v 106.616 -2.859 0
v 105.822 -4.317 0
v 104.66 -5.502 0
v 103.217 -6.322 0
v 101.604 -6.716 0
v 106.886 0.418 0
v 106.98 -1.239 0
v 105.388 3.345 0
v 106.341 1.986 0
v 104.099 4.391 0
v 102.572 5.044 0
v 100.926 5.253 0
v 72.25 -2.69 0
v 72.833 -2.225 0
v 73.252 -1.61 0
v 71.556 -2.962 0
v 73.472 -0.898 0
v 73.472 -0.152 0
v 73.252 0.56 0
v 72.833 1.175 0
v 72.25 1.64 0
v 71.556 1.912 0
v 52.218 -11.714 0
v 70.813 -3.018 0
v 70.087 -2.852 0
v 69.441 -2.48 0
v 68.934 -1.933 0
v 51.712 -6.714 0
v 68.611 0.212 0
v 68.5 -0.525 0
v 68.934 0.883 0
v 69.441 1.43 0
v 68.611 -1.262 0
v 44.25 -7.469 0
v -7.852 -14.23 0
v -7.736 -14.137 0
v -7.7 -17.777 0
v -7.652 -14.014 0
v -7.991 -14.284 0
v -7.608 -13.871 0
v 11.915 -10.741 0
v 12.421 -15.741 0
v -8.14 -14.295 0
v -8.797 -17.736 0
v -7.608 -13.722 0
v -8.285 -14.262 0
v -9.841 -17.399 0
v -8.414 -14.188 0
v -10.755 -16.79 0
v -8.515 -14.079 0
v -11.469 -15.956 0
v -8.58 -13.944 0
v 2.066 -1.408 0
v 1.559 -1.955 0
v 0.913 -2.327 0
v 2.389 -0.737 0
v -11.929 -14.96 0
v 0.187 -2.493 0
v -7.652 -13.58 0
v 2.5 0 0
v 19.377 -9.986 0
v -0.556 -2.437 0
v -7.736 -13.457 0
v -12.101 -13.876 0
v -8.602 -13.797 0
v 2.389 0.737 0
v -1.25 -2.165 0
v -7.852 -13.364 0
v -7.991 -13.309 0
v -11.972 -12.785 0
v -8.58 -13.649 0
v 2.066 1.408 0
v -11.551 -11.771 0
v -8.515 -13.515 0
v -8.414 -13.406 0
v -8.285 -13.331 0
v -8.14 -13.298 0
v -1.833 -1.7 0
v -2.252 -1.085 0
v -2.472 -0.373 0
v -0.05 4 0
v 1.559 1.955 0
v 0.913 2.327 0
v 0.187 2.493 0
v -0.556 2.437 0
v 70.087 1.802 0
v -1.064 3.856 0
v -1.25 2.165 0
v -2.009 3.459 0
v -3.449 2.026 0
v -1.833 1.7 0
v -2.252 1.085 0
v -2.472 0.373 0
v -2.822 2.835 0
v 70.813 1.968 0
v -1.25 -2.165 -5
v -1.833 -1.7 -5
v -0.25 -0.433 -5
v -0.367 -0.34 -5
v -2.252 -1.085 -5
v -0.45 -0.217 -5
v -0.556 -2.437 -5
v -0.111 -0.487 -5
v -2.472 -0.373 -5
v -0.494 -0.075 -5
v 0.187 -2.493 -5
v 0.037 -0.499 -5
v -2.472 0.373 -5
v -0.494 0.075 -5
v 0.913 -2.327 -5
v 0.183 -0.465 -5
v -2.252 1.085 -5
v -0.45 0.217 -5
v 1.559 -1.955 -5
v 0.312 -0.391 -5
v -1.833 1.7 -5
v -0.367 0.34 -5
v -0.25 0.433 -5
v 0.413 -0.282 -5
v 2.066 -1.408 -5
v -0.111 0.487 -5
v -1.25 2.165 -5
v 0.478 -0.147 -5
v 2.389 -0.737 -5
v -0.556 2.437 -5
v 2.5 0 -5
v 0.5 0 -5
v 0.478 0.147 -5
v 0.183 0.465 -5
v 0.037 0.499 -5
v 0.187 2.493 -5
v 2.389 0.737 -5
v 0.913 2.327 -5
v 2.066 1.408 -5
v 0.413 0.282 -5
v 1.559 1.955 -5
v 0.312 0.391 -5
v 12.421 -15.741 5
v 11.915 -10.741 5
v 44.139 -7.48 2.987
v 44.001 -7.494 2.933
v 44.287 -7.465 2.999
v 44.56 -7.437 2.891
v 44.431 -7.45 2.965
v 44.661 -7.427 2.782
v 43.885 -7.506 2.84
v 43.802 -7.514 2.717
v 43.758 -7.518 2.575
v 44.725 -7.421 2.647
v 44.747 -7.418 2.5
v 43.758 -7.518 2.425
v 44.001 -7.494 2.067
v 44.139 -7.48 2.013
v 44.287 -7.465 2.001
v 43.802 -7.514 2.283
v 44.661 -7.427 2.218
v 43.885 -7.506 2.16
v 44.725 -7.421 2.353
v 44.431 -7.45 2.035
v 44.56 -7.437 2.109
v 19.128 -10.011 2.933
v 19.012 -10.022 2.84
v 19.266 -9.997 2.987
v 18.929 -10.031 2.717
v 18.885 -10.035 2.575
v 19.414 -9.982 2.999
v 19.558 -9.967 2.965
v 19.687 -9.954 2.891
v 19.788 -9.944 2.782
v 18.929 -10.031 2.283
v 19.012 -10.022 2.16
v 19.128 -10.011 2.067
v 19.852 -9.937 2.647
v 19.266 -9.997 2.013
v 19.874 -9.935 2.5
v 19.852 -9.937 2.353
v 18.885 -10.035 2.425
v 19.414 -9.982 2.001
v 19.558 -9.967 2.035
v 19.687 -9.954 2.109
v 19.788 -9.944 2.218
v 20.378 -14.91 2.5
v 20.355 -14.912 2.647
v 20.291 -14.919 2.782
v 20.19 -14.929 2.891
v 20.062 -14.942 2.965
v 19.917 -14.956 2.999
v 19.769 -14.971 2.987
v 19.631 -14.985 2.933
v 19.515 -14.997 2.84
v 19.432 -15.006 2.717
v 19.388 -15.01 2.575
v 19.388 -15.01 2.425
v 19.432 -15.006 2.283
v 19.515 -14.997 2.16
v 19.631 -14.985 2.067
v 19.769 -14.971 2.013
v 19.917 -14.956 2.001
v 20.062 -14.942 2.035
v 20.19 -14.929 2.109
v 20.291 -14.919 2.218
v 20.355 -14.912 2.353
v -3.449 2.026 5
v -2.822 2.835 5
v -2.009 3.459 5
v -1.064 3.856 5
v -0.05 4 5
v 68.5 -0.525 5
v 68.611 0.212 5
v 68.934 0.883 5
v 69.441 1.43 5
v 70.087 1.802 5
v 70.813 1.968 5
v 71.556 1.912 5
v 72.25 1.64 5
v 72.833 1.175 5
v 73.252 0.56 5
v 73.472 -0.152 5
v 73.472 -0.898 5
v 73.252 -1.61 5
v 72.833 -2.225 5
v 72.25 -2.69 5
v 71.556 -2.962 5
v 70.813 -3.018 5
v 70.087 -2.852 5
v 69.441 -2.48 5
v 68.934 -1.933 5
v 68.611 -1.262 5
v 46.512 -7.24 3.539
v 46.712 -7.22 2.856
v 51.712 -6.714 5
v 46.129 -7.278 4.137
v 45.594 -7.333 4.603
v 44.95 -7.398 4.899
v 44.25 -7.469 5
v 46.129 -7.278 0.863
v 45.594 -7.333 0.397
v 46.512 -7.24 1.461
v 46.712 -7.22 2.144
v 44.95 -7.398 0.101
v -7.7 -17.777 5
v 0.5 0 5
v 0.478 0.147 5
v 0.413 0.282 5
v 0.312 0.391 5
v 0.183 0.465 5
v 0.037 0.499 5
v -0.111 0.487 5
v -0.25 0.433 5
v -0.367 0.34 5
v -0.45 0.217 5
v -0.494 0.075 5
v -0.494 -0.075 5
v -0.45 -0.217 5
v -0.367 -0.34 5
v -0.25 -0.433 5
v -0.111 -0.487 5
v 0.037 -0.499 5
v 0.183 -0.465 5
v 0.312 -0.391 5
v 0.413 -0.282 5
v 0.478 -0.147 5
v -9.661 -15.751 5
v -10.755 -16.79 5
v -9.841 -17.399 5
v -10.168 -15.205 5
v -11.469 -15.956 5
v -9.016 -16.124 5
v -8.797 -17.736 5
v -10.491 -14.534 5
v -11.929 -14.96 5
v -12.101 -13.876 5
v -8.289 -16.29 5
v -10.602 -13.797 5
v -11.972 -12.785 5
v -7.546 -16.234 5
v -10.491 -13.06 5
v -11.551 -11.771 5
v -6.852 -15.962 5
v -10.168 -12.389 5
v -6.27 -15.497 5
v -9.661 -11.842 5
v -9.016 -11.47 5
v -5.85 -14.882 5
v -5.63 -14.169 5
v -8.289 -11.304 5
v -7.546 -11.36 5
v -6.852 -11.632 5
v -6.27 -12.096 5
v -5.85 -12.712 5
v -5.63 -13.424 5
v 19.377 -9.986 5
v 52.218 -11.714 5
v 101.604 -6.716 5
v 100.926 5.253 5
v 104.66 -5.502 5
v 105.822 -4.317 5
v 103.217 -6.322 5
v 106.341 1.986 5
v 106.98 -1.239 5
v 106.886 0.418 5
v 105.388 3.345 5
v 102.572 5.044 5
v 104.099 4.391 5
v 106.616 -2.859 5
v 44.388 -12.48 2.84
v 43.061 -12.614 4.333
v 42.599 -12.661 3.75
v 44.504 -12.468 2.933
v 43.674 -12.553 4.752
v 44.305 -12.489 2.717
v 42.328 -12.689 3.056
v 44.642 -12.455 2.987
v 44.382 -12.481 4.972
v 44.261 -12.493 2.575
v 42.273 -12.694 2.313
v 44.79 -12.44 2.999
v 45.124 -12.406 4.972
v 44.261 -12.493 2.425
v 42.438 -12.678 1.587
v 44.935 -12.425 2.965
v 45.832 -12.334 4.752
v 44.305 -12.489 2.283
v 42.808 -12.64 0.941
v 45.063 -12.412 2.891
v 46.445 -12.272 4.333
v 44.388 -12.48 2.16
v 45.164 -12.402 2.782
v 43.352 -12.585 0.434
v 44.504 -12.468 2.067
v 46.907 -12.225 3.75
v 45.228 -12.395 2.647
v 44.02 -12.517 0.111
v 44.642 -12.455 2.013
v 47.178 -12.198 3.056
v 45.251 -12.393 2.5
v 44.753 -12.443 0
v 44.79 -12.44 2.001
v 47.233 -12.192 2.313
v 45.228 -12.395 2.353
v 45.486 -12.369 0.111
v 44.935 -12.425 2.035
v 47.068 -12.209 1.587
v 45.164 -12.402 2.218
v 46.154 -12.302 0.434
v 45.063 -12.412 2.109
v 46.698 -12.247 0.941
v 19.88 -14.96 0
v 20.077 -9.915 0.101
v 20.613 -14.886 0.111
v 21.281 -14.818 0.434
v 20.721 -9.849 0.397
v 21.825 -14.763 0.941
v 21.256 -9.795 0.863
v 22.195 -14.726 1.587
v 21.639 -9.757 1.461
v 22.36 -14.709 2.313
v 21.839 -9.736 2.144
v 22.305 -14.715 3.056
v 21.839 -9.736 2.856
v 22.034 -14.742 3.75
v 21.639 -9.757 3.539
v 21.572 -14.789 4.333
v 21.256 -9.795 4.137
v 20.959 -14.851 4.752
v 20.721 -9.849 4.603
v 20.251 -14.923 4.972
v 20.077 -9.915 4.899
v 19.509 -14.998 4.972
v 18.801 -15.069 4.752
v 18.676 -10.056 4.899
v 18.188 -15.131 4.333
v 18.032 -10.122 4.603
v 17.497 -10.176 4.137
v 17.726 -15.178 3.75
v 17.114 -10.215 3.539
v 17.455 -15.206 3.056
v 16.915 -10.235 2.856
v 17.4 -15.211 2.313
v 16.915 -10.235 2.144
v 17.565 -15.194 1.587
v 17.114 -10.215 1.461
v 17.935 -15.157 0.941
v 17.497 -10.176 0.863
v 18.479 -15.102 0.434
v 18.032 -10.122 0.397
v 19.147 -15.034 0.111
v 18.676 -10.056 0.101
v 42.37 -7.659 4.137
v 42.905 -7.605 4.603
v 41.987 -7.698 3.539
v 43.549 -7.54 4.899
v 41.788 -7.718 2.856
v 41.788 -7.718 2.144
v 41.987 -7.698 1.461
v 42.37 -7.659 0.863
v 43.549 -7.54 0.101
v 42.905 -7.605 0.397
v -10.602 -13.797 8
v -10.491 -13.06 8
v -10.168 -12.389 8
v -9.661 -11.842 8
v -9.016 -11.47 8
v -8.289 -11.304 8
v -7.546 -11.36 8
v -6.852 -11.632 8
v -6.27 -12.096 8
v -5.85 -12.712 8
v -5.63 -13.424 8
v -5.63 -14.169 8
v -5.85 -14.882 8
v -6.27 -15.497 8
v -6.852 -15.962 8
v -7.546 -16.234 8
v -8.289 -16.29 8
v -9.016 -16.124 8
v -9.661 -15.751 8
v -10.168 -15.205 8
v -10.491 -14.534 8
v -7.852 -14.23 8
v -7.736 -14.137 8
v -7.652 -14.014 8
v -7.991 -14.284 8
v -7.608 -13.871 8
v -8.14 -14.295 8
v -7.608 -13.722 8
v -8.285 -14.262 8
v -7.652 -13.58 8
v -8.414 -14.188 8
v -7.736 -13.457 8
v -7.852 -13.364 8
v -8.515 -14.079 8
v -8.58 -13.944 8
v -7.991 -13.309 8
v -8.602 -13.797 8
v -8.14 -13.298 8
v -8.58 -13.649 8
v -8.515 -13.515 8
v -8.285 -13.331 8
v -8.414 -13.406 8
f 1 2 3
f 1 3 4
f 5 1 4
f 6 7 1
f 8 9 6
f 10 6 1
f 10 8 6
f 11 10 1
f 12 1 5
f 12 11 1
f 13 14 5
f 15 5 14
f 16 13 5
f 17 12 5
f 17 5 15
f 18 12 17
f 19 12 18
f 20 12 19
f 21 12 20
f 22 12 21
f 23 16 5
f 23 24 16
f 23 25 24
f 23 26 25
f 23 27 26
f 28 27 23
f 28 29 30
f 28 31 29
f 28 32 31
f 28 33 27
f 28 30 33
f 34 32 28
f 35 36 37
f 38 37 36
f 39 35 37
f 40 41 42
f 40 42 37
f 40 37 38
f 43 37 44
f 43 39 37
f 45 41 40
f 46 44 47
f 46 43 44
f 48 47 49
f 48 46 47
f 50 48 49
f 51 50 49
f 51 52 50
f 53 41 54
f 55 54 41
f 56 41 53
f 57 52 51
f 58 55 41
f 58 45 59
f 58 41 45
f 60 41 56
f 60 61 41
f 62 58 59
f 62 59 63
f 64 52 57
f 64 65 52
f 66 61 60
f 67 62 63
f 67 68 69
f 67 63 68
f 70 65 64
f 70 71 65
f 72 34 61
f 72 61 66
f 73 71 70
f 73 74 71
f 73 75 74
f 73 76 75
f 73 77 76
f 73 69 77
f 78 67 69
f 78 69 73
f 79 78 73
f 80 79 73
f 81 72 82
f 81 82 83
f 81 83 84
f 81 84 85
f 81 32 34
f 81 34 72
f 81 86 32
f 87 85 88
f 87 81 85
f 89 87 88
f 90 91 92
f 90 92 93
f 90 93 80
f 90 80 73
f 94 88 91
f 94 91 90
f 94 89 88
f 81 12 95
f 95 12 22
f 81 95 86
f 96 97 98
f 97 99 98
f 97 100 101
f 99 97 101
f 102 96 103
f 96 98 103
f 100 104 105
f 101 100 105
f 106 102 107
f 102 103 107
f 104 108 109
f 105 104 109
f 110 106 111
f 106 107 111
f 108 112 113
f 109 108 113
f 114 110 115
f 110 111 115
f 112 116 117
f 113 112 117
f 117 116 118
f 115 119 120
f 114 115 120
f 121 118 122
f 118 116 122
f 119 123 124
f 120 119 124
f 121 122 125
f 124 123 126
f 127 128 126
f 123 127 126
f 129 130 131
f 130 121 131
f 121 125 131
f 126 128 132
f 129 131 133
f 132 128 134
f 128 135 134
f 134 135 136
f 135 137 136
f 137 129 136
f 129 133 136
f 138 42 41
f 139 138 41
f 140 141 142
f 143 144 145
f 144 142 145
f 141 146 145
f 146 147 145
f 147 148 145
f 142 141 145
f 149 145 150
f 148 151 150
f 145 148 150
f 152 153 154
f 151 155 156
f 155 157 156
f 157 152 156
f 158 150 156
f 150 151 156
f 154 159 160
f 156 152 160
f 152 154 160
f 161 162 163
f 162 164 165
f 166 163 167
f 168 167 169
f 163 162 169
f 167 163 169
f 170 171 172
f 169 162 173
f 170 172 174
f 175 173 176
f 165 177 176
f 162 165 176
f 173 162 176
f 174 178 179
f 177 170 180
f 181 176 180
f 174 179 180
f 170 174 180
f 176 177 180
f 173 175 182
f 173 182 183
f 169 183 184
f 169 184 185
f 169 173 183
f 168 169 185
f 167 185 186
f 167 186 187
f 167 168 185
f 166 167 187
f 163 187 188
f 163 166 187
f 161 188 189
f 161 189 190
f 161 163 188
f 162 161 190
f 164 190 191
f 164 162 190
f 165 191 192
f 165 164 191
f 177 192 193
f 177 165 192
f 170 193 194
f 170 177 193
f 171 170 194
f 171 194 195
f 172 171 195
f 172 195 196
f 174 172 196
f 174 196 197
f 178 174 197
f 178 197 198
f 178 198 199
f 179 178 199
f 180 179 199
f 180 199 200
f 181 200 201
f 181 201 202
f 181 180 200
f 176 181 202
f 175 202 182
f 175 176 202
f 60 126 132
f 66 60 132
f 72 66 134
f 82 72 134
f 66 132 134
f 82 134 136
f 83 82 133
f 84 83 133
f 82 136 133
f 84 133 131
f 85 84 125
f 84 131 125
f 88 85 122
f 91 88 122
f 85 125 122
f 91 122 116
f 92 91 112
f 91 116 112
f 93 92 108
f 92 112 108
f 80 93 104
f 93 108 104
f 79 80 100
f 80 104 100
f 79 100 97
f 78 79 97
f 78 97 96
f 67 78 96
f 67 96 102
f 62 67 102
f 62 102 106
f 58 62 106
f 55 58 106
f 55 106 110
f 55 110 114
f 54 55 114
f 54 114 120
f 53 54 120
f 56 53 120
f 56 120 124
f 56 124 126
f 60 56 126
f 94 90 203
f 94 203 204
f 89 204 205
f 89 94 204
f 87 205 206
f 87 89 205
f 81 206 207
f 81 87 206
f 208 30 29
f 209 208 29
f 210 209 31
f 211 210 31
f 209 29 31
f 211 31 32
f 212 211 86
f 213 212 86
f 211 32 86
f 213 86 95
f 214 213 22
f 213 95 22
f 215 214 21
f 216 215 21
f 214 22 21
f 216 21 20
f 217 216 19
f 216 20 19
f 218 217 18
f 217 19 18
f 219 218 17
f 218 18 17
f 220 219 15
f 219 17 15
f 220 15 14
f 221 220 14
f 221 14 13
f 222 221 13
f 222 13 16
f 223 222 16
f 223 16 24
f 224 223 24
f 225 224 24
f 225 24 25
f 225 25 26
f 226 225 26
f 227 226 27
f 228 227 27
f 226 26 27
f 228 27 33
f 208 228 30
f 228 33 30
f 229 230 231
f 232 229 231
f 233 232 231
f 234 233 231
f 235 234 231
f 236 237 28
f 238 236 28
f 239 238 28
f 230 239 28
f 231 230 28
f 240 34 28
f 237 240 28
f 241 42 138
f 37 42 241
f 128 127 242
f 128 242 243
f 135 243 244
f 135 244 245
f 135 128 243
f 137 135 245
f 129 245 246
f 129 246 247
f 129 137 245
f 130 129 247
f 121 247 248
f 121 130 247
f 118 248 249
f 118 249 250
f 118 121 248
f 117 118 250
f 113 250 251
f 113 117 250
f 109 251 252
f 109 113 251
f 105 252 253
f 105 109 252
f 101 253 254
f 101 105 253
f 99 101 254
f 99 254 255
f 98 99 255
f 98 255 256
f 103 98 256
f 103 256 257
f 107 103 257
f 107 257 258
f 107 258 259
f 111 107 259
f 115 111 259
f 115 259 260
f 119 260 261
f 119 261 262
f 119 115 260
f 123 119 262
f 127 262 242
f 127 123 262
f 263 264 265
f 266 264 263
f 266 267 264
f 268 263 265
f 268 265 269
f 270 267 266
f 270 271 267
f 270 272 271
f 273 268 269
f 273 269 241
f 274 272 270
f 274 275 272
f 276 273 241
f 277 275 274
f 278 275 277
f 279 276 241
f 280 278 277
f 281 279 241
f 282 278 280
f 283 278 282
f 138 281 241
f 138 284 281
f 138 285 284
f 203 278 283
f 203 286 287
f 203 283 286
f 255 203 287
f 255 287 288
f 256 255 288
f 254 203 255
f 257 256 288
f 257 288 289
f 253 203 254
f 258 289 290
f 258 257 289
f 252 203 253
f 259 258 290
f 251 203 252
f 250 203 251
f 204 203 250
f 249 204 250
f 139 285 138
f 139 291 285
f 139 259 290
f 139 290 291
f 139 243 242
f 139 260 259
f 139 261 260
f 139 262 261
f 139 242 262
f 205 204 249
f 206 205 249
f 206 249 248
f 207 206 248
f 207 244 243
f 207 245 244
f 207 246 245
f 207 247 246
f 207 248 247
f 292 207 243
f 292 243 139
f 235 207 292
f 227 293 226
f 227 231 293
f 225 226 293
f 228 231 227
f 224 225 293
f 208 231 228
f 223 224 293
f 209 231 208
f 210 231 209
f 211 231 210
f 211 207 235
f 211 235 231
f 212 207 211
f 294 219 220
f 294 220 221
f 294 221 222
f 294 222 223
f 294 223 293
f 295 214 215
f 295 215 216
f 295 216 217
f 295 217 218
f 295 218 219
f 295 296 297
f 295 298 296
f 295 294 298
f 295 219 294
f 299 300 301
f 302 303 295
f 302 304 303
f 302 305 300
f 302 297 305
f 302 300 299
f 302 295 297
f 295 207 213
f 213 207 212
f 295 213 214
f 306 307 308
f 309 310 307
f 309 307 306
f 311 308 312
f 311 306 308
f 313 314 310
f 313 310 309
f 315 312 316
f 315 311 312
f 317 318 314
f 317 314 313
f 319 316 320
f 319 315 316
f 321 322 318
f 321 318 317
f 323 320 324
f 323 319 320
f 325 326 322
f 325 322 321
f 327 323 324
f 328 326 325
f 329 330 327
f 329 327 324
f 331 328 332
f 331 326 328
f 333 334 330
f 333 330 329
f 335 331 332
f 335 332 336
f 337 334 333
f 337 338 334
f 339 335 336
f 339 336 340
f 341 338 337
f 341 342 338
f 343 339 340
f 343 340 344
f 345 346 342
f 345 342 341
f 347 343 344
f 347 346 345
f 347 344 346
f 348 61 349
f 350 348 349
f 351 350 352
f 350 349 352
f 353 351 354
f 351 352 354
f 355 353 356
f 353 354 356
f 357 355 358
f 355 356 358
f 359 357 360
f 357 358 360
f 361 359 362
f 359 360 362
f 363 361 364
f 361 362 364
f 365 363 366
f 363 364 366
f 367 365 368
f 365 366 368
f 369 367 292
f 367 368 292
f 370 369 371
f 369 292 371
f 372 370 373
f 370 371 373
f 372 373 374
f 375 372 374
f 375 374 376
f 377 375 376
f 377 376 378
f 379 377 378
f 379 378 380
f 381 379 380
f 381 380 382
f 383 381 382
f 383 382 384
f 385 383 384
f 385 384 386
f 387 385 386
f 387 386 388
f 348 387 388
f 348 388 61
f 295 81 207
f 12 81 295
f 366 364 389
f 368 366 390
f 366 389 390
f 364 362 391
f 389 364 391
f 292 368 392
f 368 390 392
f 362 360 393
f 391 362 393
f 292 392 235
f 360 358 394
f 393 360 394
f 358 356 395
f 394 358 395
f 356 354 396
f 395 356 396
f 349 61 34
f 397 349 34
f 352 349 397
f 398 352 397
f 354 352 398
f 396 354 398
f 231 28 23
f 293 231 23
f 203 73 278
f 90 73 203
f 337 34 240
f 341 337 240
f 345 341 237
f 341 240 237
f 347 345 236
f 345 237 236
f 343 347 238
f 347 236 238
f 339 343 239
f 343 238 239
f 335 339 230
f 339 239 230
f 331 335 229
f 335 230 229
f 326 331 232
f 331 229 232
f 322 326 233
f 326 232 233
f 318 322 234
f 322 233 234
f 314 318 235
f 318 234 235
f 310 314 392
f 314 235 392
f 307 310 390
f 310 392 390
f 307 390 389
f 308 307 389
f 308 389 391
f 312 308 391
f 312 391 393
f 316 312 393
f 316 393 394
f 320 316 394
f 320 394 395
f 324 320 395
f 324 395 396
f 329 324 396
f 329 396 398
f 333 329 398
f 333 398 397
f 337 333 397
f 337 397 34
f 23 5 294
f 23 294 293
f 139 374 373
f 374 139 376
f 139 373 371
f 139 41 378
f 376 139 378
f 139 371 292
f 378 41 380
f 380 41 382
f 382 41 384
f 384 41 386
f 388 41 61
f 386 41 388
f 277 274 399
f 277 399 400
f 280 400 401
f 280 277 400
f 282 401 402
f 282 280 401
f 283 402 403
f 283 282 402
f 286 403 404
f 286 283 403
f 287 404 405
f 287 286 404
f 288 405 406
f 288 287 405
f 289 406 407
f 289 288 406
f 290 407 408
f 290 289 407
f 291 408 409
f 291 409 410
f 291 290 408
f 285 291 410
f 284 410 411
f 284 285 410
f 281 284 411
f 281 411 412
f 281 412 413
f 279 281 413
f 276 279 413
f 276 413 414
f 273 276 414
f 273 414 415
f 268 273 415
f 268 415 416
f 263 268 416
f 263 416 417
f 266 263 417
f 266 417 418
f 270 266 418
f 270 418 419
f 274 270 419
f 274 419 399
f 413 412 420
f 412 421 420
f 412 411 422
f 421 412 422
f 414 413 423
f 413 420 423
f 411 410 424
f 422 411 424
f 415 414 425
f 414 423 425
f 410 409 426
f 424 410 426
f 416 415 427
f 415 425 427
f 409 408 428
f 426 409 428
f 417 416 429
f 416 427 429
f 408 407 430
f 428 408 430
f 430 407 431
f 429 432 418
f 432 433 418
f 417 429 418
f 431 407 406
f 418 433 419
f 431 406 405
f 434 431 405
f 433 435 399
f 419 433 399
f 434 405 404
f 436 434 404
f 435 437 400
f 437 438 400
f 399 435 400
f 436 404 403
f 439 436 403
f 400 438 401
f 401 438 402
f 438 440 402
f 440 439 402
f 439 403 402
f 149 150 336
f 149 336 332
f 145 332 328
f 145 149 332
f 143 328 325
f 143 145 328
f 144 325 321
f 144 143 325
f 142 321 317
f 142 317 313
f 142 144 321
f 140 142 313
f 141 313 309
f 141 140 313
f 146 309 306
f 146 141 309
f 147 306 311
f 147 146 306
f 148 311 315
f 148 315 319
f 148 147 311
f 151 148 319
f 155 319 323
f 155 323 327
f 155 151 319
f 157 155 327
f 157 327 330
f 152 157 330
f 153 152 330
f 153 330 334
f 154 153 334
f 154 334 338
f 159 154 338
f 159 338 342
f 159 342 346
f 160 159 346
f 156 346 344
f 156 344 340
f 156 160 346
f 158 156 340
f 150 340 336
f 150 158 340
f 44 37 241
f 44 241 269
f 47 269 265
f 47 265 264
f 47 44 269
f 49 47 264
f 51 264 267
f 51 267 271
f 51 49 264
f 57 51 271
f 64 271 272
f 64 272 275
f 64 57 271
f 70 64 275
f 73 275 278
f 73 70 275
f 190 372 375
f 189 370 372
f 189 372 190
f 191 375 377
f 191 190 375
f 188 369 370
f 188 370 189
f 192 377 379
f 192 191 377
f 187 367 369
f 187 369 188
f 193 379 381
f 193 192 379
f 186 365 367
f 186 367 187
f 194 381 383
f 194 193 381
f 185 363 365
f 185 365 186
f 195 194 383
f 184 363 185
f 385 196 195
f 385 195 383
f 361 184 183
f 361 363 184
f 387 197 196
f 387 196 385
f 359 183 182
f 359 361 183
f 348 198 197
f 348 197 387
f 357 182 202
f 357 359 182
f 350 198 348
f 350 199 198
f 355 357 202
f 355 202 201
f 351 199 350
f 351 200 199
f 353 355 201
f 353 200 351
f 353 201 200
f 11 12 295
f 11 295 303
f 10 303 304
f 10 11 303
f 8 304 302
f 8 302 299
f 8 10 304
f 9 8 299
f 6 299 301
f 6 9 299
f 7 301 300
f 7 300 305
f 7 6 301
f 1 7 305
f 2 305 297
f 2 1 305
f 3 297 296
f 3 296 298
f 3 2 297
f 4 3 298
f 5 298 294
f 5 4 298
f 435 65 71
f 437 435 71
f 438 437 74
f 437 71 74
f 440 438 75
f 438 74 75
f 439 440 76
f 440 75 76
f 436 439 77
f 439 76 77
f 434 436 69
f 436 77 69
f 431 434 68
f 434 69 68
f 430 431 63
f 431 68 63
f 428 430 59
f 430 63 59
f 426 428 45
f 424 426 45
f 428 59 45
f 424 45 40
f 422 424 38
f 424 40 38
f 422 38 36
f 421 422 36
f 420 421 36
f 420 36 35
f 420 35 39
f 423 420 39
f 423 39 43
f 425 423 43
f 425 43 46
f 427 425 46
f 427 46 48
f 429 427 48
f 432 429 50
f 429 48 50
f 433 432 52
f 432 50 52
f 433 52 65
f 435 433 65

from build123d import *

# Parameters (mm, degrees)
SKETCH3_R           = 2.5
BOSS_EXTRUDE1_DEPTH = 5
BOSS_EXTRUDE2_START = -10
SKETCH4_R           = 2.5
SKETCH4_R_2         = 0.5
BOSS_EXTRUDE2_DEPTH = 10
SKETCH5_R           = 2.5
SKETCH5_R_2         = 0.5
BOSS_EXTRUDE3_DEPTH = 8
SKETCH6_R           = 2.5
CUT_EXTRUDE1_DEPTH  = 5
CUT_EXTRUDE2_DEPTH  = 5
SKETCH8_R           = 2.5
SKETCH8_R_2         = 0.5
BOSS_EXTRUDE4_DEPTH = 5


with BuildPart() as part:
    # Sketch3 → Boss-Extrude1 (new body)
    with BuildSketch(Plane.XY):
        with BuildLine():
            Line((-11.551452097, -11.771319146), (-3.449219334, 2.025558191))
            ThreePointArc((-3.449219334, 2.025558191), (-2.00867995, 3.459075723), (-0.049634206, 3.999692044))
            Line((-0.049634206, 3.999692044), (100.92554869, 5.252744283))
            ThreePointArc((100.92554869, 5.252744283), (106.990382731, -0.40721355), (101.604045304, -6.716310453))
            Line((101.604045304, -6.716310453), (-7.699535894, -17.776555117))
            ThreePointArc((-7.699535894, -17.776555117), (-11.469136318, -15.956497778), (-11.551452097, -11.771319146))
        make_face()
        with Locations((-8.102232763, -13.796877337)):
            Circle(SKETCH3_R, mode=Mode.SUBTRACT)
        Circle(SKETCH3_R, mode=Mode.SUBTRACT)
    extrude(amount=BOSS_EXTRUDE1_DEPTH)

    # Sketch4 → Boss-Extrude2 (add)
    with BuildSketch(Plane.XY.offset(5).offset(BOSS_EXTRUDE2_START)):
        Circle(SKETCH4_R)
        Circle(SKETCH4_R_2, mode=Mode.SUBTRACT)
    extrude(amount=BOSS_EXTRUDE2_DEPTH)

    # Sketch5 → Boss-Extrude3 (add)
    with BuildSketch(Plane(origin=(0, 0, 0), x_dir=(-1, 0, 0), z_dir=(0, 0, -1))):
        with Locations((8.102232763, -13.796877337)):
            Circle(SKETCH5_R)
        with Locations((8.102232763, -13.796877337)):
            Circle(SKETCH5_R_2, mode=Mode.SUBTRACT)
    extrude(amount=-BOSS_EXTRUDE3_DEPTH)

    # Sketch6 → Cut-Extrude1 (cut)
    with BuildSketch(Plane(origin=(0, 0, 0), x_dir=(-1, 0, 0), z_dir=(0, 0, -1))):
        with Locations((-71, -0.524973847)):
            Circle(SKETCH6_R)
    extrude(amount=-CUT_EXTRUDE1_DEPTH, mode=Mode.SUBTRACT)

    # Sketch7 → Cut-Extrude2 (cut)
    with BuildSketch(Plane(origin=(0, 0, 0), x_dir=(-1, 0, 0), z_dir=(0, 0, -1))):
        Polygon((-52.217542839, -11.713647177), (-12.42076504, -15.740615868), (-11.91482349, -10.740615868), (-51.711601289, -6.713647177), align=None)
    extrude(amount=-CUT_EXTRUDE2_DEPTH, mode=Mode.SUBTRACT)

    # Sketch8 → Boss-Extrude4 (add)
    # profile 1 of 2: a face of its own
    with BuildSketch(Plane(origin=(1.196569763, -11.825177849, 0), x_dir=(0.9949194449683489, 0.10067421727469462, 0), z_dir=(0.10067421727469462, -0.9949194449683489, 0))):
        with Locations(Location((18.272986478, 2.5, 0), (0, 0, 270))):
            Circle(SKETCH8_R)
        with Locations((18.272986478, 2.5)):
            Circle(SKETCH8_R_2, mode=Mode.SUBTRACT)
    # profile 2 of 2: a face of its own
    with BuildSketch(Plane(origin=(1.196569763, -11.825177849, 0), x_dir=(0.9949194449683489, 0.10067421727469462, 0), z_dir=(0.10067421727469462, -0.9949194449683489, 0))):
        with Locations(Location((43.272986478, 2.5, 0), (0, 0, 270))):
            Circle(SKETCH8_R)
        with Locations((43.272986478, 2.5)):
            Circle(SKETCH8_R_2, mode=Mode.SUBTRACT)
    extrude(amount=BOSS_EXTRUDE4_DEPTH)


solid = part.part
